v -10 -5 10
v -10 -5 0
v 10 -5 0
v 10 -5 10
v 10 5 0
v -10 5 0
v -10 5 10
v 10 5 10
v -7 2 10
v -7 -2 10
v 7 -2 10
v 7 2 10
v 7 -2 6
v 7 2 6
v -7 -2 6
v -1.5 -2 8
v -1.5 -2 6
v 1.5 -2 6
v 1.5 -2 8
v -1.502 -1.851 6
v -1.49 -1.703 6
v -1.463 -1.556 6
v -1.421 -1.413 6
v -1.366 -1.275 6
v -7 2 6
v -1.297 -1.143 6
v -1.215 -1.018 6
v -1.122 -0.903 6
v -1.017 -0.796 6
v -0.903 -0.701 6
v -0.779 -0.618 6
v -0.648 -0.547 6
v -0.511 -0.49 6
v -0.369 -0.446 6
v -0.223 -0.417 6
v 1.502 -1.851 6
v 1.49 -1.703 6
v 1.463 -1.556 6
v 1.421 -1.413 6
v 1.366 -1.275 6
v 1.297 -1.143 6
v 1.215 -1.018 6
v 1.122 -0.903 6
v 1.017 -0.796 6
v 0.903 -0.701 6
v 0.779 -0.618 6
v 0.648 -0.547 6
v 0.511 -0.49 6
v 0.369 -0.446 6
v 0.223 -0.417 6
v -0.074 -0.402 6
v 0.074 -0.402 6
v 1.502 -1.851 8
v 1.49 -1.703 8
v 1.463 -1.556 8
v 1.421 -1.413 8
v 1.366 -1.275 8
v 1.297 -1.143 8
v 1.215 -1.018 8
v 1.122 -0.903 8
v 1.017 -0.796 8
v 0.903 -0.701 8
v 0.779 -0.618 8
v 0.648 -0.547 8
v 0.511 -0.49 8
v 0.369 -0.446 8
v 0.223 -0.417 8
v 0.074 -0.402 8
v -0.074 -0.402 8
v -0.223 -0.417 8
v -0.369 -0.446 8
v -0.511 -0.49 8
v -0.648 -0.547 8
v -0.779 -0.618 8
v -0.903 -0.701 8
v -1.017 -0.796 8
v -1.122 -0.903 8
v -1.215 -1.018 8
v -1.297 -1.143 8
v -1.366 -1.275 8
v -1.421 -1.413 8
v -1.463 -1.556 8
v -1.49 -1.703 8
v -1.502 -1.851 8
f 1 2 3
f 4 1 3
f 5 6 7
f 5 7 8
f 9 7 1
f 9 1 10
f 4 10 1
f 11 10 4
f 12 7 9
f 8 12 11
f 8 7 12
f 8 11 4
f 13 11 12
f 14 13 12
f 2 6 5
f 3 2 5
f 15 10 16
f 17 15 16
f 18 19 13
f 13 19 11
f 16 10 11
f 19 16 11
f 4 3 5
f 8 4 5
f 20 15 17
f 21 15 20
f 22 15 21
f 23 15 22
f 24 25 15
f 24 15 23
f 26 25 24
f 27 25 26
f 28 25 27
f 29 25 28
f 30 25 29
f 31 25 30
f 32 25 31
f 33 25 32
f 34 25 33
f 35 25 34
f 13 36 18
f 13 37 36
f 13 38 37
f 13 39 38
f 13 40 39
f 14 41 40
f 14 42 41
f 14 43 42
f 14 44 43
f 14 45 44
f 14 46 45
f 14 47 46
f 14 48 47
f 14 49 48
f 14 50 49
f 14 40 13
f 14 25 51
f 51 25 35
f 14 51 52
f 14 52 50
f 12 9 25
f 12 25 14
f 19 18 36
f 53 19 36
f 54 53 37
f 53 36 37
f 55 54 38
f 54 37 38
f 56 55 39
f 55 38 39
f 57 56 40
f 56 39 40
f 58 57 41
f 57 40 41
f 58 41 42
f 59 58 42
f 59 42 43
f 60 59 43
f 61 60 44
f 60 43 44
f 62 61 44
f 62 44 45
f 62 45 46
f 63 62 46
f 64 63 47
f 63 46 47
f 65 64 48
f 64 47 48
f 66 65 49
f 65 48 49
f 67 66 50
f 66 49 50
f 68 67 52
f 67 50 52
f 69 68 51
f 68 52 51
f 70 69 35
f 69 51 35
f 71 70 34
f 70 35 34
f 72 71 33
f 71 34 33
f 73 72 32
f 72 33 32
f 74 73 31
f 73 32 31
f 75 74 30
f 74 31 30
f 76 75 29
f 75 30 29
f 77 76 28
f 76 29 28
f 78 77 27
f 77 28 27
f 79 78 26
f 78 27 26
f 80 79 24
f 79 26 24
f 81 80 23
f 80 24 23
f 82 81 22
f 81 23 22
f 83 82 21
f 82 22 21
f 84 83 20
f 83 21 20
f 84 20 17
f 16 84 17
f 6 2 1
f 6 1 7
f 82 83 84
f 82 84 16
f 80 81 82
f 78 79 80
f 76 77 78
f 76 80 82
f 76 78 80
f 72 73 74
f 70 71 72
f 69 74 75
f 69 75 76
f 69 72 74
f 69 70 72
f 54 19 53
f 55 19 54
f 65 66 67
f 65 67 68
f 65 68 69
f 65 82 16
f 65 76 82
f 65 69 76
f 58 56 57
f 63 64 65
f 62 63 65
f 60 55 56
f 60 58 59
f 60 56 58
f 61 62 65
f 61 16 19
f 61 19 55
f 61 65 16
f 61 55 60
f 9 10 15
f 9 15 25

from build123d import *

# Parameters (mm, degrees)
F0_W     = 20
F0_H     = 10
F1_DEPTH = 10
F2_W     = 14
F2_H     = 4
F3_DEPTH = 4
F5_DEPTH = 2


with BuildPart() as f1:
    # F0 (on Top) → F1 (new body)
    with BuildSketch(Plane.XY):
        Rectangle(F0_W, F0_H)
    extrude(amount=F1_DEPTH)

    # F2 (on face) → F3 (cut)
    with BuildSketch(Plane.XY.offset(10)):
        Rectangle(F2_W, F2_H)
    extrude(amount=-F3_DEPTH, mode=Mode.SUBTRACT)

    # F4 (on face) → F5 (join)
    with BuildSketch(Plane.XY.offset(6)):
        with BuildLine():
            Line((-1.5, -2), (1.5, -2))
            ThreePointArc((1.5, -2), (0, -0.4), (-1.5, -2))
        make_face()
    extrude(amount=F5_DEPTH)


solid = f1.part
